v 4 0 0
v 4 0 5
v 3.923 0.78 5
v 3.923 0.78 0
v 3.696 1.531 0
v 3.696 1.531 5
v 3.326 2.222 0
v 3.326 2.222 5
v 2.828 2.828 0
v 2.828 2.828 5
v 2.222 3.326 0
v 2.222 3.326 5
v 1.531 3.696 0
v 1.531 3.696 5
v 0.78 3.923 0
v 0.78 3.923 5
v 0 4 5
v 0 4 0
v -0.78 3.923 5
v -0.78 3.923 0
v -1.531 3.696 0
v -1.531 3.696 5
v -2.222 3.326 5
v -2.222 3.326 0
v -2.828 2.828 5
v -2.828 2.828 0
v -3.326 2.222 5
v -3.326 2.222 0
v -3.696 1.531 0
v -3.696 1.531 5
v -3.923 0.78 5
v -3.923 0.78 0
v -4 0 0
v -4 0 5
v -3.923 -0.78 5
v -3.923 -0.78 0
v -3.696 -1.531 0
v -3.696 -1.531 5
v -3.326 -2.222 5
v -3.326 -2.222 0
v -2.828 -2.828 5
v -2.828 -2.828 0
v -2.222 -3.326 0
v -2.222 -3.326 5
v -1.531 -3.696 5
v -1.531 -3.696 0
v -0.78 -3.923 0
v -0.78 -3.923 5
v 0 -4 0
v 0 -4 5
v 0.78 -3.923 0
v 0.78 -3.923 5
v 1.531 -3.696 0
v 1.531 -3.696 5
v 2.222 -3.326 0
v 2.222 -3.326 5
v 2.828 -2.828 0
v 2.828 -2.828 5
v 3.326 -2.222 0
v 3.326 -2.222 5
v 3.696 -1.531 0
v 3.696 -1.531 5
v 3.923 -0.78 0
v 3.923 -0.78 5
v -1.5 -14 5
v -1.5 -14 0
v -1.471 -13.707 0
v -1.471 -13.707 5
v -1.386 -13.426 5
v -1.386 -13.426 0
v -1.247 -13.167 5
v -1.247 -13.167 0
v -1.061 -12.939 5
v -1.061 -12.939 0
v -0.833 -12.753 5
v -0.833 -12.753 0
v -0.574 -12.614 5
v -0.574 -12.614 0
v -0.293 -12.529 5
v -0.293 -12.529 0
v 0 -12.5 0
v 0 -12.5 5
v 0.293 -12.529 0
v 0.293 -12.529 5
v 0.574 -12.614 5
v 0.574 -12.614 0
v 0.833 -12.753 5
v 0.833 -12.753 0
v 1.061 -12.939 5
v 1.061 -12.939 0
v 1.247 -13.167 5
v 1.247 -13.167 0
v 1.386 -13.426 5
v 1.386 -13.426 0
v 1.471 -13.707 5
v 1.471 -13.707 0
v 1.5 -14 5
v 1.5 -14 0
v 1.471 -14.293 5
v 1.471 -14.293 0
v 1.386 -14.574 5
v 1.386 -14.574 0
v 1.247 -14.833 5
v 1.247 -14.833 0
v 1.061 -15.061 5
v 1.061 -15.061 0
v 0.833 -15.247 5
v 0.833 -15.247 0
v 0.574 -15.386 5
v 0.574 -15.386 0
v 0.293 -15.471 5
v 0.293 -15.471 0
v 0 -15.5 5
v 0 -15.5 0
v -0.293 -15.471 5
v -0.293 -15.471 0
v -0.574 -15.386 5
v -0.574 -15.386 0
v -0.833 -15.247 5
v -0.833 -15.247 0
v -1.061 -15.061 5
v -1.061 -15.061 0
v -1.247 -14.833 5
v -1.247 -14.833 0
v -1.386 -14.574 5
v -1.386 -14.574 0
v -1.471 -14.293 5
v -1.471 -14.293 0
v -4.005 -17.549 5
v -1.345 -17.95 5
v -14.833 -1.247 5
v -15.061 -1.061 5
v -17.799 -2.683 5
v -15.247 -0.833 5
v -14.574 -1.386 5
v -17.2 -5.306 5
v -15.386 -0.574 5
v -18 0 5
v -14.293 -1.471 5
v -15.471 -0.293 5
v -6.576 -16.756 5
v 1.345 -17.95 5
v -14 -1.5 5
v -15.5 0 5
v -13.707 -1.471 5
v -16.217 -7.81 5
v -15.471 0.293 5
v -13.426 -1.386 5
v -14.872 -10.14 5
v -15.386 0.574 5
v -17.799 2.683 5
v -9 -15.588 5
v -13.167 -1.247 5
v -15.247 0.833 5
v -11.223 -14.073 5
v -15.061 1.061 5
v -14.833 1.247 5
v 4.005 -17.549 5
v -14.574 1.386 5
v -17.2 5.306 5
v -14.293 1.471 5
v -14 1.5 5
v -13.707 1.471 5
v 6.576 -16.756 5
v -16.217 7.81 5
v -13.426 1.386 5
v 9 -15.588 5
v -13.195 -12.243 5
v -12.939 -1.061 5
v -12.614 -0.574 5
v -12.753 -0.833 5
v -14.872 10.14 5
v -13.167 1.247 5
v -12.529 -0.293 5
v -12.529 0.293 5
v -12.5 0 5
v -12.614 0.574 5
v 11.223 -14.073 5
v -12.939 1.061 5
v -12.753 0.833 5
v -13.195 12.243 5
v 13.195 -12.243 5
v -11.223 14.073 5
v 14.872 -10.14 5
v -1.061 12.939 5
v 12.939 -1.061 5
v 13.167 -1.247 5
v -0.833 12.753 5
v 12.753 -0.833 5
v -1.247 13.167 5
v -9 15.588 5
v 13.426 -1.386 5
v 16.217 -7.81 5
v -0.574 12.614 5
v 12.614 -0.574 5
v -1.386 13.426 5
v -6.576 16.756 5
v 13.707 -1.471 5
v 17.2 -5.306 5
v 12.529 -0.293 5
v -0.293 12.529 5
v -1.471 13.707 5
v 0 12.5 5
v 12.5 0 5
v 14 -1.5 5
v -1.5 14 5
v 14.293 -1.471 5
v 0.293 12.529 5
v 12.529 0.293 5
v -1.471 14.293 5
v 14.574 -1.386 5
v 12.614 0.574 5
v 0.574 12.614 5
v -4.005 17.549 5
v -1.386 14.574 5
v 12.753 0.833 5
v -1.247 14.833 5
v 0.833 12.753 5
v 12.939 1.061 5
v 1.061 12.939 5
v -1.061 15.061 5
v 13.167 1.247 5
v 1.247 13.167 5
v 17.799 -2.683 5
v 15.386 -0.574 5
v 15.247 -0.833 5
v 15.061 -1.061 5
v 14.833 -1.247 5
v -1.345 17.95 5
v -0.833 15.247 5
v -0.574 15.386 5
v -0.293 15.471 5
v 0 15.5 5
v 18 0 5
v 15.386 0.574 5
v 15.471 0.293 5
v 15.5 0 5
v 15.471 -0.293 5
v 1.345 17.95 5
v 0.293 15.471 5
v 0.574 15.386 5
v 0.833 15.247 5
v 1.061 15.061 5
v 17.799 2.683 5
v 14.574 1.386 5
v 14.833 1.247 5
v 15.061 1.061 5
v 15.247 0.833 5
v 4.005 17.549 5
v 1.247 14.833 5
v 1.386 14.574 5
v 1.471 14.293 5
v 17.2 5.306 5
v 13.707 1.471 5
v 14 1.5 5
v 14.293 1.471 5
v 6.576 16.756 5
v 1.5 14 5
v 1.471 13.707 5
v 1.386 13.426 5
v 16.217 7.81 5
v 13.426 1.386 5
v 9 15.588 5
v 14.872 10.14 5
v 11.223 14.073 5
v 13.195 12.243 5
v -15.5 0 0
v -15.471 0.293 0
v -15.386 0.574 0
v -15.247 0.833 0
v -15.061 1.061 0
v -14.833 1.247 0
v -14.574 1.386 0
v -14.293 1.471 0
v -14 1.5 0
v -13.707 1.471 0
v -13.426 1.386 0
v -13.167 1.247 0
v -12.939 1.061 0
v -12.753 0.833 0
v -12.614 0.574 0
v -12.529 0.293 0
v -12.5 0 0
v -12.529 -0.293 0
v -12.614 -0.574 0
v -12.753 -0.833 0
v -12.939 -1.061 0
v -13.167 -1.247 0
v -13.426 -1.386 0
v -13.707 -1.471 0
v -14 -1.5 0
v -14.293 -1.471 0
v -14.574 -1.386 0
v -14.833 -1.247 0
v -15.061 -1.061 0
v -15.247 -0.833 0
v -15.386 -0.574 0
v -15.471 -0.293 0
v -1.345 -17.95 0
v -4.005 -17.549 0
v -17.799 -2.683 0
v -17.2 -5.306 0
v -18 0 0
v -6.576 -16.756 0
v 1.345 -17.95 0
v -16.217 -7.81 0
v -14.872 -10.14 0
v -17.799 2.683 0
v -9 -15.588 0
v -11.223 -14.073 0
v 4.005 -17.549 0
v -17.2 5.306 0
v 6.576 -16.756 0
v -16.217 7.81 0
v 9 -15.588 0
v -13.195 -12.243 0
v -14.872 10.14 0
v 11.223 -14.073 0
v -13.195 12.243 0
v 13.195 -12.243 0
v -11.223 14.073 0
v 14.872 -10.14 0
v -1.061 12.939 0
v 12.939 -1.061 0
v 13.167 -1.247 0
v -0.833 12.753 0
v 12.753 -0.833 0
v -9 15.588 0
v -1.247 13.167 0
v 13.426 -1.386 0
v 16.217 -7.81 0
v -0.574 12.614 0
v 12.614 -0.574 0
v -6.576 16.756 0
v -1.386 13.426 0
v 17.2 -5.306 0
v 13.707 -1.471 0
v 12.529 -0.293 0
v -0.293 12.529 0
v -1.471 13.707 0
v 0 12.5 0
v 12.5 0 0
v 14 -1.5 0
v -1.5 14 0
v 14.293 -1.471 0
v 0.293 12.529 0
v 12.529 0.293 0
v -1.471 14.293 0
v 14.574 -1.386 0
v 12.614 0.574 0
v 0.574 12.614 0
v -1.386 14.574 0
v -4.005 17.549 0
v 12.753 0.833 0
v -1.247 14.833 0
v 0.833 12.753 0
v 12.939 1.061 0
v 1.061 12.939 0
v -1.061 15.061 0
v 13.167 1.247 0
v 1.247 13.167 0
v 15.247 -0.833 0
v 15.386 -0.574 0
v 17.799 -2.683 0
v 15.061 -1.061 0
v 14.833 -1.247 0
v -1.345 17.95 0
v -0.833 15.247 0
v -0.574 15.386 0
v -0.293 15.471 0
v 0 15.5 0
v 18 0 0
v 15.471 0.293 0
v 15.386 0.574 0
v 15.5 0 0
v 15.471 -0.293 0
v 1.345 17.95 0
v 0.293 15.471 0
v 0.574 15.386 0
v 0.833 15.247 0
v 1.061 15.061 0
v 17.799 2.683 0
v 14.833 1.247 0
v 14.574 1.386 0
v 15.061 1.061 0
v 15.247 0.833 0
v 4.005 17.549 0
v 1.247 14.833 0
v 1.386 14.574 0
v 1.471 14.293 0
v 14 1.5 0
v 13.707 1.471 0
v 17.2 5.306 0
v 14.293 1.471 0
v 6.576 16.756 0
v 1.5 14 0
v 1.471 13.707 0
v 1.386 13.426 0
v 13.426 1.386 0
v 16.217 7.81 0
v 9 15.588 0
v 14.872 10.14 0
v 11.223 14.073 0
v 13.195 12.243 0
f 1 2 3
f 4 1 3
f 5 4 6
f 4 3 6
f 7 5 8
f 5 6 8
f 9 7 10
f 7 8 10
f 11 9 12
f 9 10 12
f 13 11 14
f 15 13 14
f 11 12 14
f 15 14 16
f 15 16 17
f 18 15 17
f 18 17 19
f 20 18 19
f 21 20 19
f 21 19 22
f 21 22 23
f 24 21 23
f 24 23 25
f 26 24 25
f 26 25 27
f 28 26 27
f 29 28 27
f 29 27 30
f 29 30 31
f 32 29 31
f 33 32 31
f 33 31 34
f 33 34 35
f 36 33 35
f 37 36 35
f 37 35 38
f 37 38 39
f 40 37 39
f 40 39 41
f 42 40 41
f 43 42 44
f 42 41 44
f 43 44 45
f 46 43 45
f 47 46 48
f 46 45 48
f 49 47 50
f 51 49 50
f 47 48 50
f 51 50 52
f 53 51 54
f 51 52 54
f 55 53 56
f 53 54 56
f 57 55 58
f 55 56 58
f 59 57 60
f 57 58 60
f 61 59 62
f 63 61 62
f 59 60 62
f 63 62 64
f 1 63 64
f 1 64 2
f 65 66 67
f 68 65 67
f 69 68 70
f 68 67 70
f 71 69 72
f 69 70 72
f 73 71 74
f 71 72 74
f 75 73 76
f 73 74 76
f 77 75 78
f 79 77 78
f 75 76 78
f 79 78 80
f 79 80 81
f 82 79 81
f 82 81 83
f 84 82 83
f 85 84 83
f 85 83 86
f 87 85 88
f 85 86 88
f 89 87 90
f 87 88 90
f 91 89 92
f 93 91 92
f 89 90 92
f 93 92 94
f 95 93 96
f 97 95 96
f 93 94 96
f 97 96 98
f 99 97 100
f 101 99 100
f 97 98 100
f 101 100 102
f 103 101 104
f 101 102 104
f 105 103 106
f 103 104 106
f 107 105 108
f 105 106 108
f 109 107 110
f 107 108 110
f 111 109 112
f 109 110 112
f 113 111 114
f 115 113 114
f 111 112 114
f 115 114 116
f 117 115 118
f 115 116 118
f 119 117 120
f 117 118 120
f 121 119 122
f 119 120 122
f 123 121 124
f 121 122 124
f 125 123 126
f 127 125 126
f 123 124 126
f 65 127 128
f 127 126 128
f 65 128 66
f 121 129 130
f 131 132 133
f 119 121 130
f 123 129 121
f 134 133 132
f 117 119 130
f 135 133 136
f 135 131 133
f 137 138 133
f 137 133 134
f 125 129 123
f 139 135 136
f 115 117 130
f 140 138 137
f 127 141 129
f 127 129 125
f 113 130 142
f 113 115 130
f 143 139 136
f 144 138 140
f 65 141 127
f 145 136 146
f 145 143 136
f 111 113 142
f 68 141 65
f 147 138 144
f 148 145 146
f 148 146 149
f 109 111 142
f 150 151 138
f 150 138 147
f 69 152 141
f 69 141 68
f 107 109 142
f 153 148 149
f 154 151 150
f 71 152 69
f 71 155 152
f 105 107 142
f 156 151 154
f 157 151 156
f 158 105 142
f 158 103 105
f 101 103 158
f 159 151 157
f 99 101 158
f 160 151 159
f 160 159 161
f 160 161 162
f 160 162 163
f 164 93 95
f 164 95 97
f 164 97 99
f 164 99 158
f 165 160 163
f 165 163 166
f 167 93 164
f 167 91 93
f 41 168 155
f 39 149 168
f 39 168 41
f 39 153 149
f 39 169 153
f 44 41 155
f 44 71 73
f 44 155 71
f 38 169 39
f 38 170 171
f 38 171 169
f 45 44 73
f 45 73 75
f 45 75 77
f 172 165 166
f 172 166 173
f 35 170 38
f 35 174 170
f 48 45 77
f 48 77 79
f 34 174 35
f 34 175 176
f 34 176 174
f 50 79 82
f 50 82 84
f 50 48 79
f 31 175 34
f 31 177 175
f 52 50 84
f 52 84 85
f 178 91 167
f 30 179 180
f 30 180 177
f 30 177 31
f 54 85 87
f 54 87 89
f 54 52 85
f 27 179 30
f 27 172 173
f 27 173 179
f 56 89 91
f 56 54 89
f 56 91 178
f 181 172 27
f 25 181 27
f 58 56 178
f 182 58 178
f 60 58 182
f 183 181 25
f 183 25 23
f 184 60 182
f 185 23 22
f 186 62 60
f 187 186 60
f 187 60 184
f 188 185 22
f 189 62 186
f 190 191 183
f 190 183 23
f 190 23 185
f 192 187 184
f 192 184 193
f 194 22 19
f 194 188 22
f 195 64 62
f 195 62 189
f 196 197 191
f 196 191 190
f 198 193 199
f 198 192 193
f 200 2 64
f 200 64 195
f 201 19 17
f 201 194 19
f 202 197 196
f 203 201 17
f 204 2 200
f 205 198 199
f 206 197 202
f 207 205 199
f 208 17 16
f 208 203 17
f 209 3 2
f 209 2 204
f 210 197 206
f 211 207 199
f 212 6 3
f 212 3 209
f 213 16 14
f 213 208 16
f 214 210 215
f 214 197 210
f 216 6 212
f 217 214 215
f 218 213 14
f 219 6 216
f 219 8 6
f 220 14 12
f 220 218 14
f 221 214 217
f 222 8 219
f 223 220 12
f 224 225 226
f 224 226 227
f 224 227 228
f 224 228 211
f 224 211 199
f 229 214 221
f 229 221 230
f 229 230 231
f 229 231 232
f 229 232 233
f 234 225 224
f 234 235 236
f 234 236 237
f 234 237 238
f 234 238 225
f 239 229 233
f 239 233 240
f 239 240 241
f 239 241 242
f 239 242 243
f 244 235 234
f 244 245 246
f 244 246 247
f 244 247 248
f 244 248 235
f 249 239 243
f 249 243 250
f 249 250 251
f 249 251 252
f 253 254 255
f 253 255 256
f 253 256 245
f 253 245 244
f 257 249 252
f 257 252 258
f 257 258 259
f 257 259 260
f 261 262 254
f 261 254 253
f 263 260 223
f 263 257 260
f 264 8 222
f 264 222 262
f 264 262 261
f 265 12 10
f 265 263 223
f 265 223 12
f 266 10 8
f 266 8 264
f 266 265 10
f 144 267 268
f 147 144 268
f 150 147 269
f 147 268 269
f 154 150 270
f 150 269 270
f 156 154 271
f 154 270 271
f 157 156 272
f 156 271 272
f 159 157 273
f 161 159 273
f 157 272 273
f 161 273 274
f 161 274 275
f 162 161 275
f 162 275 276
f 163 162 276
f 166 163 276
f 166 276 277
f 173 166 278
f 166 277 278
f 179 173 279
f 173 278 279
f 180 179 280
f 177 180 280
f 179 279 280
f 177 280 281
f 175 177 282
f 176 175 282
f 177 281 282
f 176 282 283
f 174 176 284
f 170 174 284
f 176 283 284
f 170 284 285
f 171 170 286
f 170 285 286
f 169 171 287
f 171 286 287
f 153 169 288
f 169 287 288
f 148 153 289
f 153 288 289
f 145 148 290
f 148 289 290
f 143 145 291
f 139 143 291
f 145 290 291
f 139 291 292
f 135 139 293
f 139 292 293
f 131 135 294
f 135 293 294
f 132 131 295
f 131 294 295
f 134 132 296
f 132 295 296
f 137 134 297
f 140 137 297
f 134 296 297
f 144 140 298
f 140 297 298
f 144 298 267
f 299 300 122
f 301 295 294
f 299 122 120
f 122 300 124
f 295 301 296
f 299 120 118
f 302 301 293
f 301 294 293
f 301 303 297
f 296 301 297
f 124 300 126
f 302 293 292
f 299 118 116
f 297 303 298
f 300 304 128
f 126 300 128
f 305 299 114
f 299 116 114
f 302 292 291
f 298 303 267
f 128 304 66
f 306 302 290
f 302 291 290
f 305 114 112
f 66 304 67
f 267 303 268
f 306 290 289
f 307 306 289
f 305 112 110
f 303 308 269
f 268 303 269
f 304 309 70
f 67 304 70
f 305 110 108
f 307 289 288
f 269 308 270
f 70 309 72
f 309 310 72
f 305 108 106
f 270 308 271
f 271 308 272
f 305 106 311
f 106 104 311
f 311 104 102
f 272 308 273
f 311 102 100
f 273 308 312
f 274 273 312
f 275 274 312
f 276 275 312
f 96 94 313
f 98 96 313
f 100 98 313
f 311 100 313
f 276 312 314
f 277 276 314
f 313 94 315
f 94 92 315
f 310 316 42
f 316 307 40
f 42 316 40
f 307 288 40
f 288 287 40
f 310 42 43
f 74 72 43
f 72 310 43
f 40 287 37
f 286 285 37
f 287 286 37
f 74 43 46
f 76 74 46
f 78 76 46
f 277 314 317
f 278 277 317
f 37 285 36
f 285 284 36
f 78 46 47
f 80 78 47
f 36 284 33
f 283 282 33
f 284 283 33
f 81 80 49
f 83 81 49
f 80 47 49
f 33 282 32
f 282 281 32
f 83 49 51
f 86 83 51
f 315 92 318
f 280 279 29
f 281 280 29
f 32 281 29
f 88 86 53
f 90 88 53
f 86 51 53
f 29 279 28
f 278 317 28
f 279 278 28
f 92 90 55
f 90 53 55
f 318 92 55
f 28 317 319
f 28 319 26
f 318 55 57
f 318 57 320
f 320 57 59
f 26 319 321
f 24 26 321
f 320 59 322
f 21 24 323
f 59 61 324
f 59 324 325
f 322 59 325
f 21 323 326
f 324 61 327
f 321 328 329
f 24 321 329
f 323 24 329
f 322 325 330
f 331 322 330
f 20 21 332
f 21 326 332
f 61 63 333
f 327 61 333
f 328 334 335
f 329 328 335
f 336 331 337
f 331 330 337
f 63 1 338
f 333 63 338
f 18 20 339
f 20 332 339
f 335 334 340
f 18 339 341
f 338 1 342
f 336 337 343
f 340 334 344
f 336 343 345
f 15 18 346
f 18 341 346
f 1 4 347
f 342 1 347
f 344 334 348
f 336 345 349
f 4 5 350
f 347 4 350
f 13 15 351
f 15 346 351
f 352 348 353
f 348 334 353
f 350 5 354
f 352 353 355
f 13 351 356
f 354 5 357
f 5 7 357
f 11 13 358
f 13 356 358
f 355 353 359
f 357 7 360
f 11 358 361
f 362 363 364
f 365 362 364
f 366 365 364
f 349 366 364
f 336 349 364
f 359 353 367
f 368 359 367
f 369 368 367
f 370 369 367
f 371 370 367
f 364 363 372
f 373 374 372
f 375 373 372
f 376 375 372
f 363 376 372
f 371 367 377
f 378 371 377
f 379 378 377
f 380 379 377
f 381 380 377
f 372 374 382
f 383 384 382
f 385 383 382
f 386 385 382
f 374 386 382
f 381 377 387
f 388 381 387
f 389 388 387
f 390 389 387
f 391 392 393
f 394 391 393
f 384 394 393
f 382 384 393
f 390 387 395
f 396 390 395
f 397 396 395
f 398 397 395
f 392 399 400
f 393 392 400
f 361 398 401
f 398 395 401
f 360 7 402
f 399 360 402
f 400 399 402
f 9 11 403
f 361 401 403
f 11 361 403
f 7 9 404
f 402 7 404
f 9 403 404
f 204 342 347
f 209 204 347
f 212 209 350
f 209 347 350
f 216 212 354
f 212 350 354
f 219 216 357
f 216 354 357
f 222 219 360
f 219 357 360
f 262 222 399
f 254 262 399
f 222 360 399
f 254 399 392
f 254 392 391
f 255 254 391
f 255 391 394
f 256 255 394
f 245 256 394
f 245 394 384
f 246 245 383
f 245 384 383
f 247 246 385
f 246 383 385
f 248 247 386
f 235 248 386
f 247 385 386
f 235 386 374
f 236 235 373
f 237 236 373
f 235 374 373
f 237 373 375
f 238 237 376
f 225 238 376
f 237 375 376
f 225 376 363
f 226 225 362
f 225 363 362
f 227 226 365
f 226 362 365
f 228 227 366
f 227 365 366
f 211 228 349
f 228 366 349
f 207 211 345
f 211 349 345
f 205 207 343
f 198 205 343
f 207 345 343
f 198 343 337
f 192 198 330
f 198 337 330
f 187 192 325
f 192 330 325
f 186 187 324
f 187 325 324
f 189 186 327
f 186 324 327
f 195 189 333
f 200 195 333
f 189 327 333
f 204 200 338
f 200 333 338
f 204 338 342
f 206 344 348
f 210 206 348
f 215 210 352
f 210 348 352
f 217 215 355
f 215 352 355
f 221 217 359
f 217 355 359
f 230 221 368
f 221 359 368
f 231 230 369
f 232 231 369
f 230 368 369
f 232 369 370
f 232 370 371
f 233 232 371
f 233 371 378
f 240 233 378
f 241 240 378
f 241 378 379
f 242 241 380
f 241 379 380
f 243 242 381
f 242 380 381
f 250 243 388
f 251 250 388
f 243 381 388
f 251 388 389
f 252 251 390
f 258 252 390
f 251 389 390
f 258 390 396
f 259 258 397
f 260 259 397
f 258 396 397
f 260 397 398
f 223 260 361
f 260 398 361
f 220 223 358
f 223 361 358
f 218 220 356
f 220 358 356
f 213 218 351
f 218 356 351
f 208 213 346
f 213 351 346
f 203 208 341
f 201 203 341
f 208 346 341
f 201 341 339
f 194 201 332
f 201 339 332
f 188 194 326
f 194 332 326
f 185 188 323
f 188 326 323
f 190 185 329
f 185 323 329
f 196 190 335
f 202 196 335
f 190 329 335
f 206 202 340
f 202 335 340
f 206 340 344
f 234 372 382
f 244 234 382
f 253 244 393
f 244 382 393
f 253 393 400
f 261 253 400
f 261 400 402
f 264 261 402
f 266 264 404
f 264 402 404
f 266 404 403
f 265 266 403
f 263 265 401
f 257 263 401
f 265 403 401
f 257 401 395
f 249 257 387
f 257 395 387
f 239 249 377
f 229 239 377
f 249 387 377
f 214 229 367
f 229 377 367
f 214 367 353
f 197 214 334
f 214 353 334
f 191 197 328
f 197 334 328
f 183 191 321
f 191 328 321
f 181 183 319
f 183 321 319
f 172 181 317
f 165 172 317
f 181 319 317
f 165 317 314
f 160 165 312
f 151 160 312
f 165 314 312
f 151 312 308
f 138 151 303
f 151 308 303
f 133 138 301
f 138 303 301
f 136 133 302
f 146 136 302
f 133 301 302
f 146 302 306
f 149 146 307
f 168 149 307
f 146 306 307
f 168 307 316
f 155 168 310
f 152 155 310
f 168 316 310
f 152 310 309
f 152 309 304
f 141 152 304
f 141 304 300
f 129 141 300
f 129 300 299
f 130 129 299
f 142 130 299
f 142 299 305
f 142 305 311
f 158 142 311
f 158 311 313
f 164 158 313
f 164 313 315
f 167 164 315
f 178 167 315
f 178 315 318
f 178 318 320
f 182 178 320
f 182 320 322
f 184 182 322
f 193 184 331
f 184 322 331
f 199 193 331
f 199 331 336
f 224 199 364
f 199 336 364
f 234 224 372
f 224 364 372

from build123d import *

# Parameters (mm, degrees)
SKETCH2_R           = 18
BOSS_EXTRUDE1_DEPTH = 5
SKETCH3_R           = 4
CUT_EXTRUDE1_DEPTH  = 122
SKETCH4_R           = 1.5
CUT_EXTRUDE2_DEPTH  = 5


with BuildPart() as part:
    # Sketch2 → Boss-Extrude1 (new body)
    with BuildSketch(Plane.XY):
        Circle(SKETCH2_R)
    extrude(amount=BOSS_EXTRUDE1_DEPTH)

    # Sketch3 → Cut-Extrude1 (cut)
    with BuildSketch(Plane.XY.offset(5)):
        Circle(SKETCH3_R)
    extrude(amount=-CUT_EXTRUDE1_DEPTH, mode=Mode.SUBTRACT)

    # Sketch4 → Cut-Extrude2 (cut)
    with BuildSketch(Plane(origin=(0, 0, 0), x_dir=(-1, 0, 0), z_dir=(0, 0, -1))):
        with Locations((0, 14)):
            Circle(SKETCH4_R)
        with Locations((14, 0)):
            Circle(SKETCH4_R)
        with Locations((0, -14)):
            Circle(SKETCH4_R)
        with Locations((-14, 0)):
            Circle(SKETCH4_R)
    extrude(amount=-CUT_EXTRUDE2_DEPTH, mode=Mode.SUBTRACT)


solid = part.part
